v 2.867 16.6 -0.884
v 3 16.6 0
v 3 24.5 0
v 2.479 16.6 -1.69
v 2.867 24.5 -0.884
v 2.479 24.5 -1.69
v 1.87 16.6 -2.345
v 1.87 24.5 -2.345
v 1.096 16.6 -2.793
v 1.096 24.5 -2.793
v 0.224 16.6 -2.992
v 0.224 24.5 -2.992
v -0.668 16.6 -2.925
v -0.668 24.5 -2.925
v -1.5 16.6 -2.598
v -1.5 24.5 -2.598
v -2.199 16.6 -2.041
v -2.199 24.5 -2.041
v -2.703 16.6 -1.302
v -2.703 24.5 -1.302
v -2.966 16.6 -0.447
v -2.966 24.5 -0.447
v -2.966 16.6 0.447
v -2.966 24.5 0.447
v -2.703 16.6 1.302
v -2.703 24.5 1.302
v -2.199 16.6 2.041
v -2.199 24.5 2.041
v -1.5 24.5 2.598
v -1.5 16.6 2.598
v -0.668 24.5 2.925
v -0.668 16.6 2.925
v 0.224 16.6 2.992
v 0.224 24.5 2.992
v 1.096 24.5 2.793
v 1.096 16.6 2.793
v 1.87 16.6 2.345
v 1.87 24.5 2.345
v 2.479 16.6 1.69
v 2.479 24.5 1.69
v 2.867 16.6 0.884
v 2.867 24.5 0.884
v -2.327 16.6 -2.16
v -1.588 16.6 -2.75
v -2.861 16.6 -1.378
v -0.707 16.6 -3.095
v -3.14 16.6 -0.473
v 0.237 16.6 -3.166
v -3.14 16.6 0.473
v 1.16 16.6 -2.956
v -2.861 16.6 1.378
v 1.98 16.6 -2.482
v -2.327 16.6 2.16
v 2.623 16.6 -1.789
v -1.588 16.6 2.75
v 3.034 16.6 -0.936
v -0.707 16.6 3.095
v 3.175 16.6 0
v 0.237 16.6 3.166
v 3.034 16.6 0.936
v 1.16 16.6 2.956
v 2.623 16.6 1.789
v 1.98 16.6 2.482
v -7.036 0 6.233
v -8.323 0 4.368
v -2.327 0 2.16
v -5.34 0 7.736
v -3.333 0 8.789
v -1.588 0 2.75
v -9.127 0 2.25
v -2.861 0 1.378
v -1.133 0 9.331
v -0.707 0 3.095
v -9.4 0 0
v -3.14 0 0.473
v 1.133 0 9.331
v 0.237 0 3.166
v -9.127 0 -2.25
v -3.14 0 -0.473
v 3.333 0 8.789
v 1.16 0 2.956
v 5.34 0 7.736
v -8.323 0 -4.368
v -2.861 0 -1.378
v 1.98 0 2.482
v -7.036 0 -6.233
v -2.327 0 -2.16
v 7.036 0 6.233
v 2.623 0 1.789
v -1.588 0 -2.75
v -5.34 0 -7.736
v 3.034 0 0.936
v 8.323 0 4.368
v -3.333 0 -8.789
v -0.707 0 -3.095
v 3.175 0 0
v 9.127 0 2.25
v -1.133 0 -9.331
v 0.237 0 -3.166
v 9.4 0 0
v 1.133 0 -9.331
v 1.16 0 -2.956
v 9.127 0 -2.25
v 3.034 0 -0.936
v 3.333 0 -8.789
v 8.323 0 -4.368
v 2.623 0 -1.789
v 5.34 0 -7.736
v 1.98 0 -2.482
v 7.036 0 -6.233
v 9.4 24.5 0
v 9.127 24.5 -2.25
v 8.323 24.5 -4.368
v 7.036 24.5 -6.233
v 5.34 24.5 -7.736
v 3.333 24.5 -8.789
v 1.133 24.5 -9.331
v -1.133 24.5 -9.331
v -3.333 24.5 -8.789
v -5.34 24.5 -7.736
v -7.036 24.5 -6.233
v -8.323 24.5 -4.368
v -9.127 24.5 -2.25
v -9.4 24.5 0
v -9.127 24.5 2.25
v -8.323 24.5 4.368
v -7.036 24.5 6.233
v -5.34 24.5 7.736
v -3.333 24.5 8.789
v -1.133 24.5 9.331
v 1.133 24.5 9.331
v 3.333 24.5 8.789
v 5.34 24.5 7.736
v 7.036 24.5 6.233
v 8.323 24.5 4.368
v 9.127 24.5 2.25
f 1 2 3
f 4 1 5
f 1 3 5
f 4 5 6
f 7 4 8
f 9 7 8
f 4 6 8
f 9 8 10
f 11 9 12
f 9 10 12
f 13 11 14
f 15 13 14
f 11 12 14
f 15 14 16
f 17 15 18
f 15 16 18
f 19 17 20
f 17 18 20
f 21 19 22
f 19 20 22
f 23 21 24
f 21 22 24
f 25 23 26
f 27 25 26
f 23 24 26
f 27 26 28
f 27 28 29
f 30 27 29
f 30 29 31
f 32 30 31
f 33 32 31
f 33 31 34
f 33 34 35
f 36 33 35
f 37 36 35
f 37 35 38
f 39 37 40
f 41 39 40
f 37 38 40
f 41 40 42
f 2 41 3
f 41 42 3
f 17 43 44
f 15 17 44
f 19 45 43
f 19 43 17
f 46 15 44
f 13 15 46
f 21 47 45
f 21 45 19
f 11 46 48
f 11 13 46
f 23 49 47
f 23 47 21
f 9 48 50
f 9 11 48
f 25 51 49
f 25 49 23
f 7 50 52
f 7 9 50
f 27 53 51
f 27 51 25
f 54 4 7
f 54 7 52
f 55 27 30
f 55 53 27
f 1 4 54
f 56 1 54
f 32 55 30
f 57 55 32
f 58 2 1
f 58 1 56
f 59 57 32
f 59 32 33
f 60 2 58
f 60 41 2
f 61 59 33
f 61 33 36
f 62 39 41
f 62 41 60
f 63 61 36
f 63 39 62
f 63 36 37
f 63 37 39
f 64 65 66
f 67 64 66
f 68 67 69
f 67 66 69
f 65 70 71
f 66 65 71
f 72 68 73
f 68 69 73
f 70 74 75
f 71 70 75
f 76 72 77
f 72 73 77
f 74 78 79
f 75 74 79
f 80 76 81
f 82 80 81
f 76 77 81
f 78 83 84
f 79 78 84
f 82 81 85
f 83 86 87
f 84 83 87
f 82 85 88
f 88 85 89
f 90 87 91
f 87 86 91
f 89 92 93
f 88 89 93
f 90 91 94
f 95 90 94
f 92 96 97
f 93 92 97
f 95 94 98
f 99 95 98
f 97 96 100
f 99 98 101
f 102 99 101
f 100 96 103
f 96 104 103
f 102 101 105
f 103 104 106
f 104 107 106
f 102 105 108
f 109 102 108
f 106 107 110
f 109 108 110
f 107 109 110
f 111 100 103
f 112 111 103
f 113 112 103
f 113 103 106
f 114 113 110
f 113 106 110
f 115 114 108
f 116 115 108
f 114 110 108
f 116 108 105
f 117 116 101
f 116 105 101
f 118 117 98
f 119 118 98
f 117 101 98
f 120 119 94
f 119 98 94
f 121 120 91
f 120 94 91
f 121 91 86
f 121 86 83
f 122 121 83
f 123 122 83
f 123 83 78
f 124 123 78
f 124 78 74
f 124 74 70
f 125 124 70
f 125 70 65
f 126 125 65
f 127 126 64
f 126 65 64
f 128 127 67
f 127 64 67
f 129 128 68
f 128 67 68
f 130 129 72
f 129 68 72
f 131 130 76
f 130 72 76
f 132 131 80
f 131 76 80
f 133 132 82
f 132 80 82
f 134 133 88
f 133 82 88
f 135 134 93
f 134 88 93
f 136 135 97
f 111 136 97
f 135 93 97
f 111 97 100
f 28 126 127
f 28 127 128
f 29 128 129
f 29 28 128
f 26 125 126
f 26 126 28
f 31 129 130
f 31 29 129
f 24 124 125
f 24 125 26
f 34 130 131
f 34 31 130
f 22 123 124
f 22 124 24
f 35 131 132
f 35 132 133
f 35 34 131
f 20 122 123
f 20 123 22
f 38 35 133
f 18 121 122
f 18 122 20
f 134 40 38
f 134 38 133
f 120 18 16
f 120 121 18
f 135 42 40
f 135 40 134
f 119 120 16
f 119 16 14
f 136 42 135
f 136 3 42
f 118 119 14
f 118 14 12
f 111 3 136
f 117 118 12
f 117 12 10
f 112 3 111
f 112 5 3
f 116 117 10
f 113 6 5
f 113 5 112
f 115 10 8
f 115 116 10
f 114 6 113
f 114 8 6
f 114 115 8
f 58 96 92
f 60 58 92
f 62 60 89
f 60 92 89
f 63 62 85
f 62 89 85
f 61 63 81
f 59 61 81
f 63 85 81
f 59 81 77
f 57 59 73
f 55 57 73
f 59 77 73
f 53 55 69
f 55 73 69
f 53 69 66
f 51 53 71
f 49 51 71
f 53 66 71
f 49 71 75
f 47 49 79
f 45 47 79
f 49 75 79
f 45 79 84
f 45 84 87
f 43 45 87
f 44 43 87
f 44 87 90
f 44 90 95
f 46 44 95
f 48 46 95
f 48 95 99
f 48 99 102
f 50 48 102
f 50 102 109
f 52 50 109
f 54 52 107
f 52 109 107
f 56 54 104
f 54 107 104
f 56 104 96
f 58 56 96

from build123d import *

# Parameters (mm, degrees)
SKETCH2_R           = 9.4
BOSS_EXTRUDE1_DEPTH = 24.5
SKETCH3_R           = 3
CUT_EXTRUDE1_DEPTH  = 7.9
SKETCH4_R           = 3.175
CUT_EXTRUDE2_DEPTH  = 16.6


with BuildPart() as part:
    # Sketch2 → Boss-Extrude1 (new body)
    with BuildSketch(Plane(origin=(0, 0, 0), x_dir=(1, 0, 0), z_dir=(0, 1, 0))):
        Circle(SKETCH2_R)
    extrude(amount=BOSS_EXTRUDE1_DEPTH)

    # Sketch3 → Cut-Extrude1 (cut)
    with BuildSketch(Plane(origin=(0, 24.5, 0), x_dir=(1, 0, 0), z_dir=(0, 1, 0))):
        Circle(SKETCH3_R)
    extrude(amount=-CUT_EXTRUDE1_DEPTH, mode=Mode.SUBTRACT)

    # Sketch4 → Cut-Extrude2 (cut)
    with BuildSketch(Plane.XZ):
        Circle(SKETCH4_R)
    extrude(amount=-CUT_EXTRUDE2_DEPTH, mode=Mode.SUBTRACT)


solid = part.part
